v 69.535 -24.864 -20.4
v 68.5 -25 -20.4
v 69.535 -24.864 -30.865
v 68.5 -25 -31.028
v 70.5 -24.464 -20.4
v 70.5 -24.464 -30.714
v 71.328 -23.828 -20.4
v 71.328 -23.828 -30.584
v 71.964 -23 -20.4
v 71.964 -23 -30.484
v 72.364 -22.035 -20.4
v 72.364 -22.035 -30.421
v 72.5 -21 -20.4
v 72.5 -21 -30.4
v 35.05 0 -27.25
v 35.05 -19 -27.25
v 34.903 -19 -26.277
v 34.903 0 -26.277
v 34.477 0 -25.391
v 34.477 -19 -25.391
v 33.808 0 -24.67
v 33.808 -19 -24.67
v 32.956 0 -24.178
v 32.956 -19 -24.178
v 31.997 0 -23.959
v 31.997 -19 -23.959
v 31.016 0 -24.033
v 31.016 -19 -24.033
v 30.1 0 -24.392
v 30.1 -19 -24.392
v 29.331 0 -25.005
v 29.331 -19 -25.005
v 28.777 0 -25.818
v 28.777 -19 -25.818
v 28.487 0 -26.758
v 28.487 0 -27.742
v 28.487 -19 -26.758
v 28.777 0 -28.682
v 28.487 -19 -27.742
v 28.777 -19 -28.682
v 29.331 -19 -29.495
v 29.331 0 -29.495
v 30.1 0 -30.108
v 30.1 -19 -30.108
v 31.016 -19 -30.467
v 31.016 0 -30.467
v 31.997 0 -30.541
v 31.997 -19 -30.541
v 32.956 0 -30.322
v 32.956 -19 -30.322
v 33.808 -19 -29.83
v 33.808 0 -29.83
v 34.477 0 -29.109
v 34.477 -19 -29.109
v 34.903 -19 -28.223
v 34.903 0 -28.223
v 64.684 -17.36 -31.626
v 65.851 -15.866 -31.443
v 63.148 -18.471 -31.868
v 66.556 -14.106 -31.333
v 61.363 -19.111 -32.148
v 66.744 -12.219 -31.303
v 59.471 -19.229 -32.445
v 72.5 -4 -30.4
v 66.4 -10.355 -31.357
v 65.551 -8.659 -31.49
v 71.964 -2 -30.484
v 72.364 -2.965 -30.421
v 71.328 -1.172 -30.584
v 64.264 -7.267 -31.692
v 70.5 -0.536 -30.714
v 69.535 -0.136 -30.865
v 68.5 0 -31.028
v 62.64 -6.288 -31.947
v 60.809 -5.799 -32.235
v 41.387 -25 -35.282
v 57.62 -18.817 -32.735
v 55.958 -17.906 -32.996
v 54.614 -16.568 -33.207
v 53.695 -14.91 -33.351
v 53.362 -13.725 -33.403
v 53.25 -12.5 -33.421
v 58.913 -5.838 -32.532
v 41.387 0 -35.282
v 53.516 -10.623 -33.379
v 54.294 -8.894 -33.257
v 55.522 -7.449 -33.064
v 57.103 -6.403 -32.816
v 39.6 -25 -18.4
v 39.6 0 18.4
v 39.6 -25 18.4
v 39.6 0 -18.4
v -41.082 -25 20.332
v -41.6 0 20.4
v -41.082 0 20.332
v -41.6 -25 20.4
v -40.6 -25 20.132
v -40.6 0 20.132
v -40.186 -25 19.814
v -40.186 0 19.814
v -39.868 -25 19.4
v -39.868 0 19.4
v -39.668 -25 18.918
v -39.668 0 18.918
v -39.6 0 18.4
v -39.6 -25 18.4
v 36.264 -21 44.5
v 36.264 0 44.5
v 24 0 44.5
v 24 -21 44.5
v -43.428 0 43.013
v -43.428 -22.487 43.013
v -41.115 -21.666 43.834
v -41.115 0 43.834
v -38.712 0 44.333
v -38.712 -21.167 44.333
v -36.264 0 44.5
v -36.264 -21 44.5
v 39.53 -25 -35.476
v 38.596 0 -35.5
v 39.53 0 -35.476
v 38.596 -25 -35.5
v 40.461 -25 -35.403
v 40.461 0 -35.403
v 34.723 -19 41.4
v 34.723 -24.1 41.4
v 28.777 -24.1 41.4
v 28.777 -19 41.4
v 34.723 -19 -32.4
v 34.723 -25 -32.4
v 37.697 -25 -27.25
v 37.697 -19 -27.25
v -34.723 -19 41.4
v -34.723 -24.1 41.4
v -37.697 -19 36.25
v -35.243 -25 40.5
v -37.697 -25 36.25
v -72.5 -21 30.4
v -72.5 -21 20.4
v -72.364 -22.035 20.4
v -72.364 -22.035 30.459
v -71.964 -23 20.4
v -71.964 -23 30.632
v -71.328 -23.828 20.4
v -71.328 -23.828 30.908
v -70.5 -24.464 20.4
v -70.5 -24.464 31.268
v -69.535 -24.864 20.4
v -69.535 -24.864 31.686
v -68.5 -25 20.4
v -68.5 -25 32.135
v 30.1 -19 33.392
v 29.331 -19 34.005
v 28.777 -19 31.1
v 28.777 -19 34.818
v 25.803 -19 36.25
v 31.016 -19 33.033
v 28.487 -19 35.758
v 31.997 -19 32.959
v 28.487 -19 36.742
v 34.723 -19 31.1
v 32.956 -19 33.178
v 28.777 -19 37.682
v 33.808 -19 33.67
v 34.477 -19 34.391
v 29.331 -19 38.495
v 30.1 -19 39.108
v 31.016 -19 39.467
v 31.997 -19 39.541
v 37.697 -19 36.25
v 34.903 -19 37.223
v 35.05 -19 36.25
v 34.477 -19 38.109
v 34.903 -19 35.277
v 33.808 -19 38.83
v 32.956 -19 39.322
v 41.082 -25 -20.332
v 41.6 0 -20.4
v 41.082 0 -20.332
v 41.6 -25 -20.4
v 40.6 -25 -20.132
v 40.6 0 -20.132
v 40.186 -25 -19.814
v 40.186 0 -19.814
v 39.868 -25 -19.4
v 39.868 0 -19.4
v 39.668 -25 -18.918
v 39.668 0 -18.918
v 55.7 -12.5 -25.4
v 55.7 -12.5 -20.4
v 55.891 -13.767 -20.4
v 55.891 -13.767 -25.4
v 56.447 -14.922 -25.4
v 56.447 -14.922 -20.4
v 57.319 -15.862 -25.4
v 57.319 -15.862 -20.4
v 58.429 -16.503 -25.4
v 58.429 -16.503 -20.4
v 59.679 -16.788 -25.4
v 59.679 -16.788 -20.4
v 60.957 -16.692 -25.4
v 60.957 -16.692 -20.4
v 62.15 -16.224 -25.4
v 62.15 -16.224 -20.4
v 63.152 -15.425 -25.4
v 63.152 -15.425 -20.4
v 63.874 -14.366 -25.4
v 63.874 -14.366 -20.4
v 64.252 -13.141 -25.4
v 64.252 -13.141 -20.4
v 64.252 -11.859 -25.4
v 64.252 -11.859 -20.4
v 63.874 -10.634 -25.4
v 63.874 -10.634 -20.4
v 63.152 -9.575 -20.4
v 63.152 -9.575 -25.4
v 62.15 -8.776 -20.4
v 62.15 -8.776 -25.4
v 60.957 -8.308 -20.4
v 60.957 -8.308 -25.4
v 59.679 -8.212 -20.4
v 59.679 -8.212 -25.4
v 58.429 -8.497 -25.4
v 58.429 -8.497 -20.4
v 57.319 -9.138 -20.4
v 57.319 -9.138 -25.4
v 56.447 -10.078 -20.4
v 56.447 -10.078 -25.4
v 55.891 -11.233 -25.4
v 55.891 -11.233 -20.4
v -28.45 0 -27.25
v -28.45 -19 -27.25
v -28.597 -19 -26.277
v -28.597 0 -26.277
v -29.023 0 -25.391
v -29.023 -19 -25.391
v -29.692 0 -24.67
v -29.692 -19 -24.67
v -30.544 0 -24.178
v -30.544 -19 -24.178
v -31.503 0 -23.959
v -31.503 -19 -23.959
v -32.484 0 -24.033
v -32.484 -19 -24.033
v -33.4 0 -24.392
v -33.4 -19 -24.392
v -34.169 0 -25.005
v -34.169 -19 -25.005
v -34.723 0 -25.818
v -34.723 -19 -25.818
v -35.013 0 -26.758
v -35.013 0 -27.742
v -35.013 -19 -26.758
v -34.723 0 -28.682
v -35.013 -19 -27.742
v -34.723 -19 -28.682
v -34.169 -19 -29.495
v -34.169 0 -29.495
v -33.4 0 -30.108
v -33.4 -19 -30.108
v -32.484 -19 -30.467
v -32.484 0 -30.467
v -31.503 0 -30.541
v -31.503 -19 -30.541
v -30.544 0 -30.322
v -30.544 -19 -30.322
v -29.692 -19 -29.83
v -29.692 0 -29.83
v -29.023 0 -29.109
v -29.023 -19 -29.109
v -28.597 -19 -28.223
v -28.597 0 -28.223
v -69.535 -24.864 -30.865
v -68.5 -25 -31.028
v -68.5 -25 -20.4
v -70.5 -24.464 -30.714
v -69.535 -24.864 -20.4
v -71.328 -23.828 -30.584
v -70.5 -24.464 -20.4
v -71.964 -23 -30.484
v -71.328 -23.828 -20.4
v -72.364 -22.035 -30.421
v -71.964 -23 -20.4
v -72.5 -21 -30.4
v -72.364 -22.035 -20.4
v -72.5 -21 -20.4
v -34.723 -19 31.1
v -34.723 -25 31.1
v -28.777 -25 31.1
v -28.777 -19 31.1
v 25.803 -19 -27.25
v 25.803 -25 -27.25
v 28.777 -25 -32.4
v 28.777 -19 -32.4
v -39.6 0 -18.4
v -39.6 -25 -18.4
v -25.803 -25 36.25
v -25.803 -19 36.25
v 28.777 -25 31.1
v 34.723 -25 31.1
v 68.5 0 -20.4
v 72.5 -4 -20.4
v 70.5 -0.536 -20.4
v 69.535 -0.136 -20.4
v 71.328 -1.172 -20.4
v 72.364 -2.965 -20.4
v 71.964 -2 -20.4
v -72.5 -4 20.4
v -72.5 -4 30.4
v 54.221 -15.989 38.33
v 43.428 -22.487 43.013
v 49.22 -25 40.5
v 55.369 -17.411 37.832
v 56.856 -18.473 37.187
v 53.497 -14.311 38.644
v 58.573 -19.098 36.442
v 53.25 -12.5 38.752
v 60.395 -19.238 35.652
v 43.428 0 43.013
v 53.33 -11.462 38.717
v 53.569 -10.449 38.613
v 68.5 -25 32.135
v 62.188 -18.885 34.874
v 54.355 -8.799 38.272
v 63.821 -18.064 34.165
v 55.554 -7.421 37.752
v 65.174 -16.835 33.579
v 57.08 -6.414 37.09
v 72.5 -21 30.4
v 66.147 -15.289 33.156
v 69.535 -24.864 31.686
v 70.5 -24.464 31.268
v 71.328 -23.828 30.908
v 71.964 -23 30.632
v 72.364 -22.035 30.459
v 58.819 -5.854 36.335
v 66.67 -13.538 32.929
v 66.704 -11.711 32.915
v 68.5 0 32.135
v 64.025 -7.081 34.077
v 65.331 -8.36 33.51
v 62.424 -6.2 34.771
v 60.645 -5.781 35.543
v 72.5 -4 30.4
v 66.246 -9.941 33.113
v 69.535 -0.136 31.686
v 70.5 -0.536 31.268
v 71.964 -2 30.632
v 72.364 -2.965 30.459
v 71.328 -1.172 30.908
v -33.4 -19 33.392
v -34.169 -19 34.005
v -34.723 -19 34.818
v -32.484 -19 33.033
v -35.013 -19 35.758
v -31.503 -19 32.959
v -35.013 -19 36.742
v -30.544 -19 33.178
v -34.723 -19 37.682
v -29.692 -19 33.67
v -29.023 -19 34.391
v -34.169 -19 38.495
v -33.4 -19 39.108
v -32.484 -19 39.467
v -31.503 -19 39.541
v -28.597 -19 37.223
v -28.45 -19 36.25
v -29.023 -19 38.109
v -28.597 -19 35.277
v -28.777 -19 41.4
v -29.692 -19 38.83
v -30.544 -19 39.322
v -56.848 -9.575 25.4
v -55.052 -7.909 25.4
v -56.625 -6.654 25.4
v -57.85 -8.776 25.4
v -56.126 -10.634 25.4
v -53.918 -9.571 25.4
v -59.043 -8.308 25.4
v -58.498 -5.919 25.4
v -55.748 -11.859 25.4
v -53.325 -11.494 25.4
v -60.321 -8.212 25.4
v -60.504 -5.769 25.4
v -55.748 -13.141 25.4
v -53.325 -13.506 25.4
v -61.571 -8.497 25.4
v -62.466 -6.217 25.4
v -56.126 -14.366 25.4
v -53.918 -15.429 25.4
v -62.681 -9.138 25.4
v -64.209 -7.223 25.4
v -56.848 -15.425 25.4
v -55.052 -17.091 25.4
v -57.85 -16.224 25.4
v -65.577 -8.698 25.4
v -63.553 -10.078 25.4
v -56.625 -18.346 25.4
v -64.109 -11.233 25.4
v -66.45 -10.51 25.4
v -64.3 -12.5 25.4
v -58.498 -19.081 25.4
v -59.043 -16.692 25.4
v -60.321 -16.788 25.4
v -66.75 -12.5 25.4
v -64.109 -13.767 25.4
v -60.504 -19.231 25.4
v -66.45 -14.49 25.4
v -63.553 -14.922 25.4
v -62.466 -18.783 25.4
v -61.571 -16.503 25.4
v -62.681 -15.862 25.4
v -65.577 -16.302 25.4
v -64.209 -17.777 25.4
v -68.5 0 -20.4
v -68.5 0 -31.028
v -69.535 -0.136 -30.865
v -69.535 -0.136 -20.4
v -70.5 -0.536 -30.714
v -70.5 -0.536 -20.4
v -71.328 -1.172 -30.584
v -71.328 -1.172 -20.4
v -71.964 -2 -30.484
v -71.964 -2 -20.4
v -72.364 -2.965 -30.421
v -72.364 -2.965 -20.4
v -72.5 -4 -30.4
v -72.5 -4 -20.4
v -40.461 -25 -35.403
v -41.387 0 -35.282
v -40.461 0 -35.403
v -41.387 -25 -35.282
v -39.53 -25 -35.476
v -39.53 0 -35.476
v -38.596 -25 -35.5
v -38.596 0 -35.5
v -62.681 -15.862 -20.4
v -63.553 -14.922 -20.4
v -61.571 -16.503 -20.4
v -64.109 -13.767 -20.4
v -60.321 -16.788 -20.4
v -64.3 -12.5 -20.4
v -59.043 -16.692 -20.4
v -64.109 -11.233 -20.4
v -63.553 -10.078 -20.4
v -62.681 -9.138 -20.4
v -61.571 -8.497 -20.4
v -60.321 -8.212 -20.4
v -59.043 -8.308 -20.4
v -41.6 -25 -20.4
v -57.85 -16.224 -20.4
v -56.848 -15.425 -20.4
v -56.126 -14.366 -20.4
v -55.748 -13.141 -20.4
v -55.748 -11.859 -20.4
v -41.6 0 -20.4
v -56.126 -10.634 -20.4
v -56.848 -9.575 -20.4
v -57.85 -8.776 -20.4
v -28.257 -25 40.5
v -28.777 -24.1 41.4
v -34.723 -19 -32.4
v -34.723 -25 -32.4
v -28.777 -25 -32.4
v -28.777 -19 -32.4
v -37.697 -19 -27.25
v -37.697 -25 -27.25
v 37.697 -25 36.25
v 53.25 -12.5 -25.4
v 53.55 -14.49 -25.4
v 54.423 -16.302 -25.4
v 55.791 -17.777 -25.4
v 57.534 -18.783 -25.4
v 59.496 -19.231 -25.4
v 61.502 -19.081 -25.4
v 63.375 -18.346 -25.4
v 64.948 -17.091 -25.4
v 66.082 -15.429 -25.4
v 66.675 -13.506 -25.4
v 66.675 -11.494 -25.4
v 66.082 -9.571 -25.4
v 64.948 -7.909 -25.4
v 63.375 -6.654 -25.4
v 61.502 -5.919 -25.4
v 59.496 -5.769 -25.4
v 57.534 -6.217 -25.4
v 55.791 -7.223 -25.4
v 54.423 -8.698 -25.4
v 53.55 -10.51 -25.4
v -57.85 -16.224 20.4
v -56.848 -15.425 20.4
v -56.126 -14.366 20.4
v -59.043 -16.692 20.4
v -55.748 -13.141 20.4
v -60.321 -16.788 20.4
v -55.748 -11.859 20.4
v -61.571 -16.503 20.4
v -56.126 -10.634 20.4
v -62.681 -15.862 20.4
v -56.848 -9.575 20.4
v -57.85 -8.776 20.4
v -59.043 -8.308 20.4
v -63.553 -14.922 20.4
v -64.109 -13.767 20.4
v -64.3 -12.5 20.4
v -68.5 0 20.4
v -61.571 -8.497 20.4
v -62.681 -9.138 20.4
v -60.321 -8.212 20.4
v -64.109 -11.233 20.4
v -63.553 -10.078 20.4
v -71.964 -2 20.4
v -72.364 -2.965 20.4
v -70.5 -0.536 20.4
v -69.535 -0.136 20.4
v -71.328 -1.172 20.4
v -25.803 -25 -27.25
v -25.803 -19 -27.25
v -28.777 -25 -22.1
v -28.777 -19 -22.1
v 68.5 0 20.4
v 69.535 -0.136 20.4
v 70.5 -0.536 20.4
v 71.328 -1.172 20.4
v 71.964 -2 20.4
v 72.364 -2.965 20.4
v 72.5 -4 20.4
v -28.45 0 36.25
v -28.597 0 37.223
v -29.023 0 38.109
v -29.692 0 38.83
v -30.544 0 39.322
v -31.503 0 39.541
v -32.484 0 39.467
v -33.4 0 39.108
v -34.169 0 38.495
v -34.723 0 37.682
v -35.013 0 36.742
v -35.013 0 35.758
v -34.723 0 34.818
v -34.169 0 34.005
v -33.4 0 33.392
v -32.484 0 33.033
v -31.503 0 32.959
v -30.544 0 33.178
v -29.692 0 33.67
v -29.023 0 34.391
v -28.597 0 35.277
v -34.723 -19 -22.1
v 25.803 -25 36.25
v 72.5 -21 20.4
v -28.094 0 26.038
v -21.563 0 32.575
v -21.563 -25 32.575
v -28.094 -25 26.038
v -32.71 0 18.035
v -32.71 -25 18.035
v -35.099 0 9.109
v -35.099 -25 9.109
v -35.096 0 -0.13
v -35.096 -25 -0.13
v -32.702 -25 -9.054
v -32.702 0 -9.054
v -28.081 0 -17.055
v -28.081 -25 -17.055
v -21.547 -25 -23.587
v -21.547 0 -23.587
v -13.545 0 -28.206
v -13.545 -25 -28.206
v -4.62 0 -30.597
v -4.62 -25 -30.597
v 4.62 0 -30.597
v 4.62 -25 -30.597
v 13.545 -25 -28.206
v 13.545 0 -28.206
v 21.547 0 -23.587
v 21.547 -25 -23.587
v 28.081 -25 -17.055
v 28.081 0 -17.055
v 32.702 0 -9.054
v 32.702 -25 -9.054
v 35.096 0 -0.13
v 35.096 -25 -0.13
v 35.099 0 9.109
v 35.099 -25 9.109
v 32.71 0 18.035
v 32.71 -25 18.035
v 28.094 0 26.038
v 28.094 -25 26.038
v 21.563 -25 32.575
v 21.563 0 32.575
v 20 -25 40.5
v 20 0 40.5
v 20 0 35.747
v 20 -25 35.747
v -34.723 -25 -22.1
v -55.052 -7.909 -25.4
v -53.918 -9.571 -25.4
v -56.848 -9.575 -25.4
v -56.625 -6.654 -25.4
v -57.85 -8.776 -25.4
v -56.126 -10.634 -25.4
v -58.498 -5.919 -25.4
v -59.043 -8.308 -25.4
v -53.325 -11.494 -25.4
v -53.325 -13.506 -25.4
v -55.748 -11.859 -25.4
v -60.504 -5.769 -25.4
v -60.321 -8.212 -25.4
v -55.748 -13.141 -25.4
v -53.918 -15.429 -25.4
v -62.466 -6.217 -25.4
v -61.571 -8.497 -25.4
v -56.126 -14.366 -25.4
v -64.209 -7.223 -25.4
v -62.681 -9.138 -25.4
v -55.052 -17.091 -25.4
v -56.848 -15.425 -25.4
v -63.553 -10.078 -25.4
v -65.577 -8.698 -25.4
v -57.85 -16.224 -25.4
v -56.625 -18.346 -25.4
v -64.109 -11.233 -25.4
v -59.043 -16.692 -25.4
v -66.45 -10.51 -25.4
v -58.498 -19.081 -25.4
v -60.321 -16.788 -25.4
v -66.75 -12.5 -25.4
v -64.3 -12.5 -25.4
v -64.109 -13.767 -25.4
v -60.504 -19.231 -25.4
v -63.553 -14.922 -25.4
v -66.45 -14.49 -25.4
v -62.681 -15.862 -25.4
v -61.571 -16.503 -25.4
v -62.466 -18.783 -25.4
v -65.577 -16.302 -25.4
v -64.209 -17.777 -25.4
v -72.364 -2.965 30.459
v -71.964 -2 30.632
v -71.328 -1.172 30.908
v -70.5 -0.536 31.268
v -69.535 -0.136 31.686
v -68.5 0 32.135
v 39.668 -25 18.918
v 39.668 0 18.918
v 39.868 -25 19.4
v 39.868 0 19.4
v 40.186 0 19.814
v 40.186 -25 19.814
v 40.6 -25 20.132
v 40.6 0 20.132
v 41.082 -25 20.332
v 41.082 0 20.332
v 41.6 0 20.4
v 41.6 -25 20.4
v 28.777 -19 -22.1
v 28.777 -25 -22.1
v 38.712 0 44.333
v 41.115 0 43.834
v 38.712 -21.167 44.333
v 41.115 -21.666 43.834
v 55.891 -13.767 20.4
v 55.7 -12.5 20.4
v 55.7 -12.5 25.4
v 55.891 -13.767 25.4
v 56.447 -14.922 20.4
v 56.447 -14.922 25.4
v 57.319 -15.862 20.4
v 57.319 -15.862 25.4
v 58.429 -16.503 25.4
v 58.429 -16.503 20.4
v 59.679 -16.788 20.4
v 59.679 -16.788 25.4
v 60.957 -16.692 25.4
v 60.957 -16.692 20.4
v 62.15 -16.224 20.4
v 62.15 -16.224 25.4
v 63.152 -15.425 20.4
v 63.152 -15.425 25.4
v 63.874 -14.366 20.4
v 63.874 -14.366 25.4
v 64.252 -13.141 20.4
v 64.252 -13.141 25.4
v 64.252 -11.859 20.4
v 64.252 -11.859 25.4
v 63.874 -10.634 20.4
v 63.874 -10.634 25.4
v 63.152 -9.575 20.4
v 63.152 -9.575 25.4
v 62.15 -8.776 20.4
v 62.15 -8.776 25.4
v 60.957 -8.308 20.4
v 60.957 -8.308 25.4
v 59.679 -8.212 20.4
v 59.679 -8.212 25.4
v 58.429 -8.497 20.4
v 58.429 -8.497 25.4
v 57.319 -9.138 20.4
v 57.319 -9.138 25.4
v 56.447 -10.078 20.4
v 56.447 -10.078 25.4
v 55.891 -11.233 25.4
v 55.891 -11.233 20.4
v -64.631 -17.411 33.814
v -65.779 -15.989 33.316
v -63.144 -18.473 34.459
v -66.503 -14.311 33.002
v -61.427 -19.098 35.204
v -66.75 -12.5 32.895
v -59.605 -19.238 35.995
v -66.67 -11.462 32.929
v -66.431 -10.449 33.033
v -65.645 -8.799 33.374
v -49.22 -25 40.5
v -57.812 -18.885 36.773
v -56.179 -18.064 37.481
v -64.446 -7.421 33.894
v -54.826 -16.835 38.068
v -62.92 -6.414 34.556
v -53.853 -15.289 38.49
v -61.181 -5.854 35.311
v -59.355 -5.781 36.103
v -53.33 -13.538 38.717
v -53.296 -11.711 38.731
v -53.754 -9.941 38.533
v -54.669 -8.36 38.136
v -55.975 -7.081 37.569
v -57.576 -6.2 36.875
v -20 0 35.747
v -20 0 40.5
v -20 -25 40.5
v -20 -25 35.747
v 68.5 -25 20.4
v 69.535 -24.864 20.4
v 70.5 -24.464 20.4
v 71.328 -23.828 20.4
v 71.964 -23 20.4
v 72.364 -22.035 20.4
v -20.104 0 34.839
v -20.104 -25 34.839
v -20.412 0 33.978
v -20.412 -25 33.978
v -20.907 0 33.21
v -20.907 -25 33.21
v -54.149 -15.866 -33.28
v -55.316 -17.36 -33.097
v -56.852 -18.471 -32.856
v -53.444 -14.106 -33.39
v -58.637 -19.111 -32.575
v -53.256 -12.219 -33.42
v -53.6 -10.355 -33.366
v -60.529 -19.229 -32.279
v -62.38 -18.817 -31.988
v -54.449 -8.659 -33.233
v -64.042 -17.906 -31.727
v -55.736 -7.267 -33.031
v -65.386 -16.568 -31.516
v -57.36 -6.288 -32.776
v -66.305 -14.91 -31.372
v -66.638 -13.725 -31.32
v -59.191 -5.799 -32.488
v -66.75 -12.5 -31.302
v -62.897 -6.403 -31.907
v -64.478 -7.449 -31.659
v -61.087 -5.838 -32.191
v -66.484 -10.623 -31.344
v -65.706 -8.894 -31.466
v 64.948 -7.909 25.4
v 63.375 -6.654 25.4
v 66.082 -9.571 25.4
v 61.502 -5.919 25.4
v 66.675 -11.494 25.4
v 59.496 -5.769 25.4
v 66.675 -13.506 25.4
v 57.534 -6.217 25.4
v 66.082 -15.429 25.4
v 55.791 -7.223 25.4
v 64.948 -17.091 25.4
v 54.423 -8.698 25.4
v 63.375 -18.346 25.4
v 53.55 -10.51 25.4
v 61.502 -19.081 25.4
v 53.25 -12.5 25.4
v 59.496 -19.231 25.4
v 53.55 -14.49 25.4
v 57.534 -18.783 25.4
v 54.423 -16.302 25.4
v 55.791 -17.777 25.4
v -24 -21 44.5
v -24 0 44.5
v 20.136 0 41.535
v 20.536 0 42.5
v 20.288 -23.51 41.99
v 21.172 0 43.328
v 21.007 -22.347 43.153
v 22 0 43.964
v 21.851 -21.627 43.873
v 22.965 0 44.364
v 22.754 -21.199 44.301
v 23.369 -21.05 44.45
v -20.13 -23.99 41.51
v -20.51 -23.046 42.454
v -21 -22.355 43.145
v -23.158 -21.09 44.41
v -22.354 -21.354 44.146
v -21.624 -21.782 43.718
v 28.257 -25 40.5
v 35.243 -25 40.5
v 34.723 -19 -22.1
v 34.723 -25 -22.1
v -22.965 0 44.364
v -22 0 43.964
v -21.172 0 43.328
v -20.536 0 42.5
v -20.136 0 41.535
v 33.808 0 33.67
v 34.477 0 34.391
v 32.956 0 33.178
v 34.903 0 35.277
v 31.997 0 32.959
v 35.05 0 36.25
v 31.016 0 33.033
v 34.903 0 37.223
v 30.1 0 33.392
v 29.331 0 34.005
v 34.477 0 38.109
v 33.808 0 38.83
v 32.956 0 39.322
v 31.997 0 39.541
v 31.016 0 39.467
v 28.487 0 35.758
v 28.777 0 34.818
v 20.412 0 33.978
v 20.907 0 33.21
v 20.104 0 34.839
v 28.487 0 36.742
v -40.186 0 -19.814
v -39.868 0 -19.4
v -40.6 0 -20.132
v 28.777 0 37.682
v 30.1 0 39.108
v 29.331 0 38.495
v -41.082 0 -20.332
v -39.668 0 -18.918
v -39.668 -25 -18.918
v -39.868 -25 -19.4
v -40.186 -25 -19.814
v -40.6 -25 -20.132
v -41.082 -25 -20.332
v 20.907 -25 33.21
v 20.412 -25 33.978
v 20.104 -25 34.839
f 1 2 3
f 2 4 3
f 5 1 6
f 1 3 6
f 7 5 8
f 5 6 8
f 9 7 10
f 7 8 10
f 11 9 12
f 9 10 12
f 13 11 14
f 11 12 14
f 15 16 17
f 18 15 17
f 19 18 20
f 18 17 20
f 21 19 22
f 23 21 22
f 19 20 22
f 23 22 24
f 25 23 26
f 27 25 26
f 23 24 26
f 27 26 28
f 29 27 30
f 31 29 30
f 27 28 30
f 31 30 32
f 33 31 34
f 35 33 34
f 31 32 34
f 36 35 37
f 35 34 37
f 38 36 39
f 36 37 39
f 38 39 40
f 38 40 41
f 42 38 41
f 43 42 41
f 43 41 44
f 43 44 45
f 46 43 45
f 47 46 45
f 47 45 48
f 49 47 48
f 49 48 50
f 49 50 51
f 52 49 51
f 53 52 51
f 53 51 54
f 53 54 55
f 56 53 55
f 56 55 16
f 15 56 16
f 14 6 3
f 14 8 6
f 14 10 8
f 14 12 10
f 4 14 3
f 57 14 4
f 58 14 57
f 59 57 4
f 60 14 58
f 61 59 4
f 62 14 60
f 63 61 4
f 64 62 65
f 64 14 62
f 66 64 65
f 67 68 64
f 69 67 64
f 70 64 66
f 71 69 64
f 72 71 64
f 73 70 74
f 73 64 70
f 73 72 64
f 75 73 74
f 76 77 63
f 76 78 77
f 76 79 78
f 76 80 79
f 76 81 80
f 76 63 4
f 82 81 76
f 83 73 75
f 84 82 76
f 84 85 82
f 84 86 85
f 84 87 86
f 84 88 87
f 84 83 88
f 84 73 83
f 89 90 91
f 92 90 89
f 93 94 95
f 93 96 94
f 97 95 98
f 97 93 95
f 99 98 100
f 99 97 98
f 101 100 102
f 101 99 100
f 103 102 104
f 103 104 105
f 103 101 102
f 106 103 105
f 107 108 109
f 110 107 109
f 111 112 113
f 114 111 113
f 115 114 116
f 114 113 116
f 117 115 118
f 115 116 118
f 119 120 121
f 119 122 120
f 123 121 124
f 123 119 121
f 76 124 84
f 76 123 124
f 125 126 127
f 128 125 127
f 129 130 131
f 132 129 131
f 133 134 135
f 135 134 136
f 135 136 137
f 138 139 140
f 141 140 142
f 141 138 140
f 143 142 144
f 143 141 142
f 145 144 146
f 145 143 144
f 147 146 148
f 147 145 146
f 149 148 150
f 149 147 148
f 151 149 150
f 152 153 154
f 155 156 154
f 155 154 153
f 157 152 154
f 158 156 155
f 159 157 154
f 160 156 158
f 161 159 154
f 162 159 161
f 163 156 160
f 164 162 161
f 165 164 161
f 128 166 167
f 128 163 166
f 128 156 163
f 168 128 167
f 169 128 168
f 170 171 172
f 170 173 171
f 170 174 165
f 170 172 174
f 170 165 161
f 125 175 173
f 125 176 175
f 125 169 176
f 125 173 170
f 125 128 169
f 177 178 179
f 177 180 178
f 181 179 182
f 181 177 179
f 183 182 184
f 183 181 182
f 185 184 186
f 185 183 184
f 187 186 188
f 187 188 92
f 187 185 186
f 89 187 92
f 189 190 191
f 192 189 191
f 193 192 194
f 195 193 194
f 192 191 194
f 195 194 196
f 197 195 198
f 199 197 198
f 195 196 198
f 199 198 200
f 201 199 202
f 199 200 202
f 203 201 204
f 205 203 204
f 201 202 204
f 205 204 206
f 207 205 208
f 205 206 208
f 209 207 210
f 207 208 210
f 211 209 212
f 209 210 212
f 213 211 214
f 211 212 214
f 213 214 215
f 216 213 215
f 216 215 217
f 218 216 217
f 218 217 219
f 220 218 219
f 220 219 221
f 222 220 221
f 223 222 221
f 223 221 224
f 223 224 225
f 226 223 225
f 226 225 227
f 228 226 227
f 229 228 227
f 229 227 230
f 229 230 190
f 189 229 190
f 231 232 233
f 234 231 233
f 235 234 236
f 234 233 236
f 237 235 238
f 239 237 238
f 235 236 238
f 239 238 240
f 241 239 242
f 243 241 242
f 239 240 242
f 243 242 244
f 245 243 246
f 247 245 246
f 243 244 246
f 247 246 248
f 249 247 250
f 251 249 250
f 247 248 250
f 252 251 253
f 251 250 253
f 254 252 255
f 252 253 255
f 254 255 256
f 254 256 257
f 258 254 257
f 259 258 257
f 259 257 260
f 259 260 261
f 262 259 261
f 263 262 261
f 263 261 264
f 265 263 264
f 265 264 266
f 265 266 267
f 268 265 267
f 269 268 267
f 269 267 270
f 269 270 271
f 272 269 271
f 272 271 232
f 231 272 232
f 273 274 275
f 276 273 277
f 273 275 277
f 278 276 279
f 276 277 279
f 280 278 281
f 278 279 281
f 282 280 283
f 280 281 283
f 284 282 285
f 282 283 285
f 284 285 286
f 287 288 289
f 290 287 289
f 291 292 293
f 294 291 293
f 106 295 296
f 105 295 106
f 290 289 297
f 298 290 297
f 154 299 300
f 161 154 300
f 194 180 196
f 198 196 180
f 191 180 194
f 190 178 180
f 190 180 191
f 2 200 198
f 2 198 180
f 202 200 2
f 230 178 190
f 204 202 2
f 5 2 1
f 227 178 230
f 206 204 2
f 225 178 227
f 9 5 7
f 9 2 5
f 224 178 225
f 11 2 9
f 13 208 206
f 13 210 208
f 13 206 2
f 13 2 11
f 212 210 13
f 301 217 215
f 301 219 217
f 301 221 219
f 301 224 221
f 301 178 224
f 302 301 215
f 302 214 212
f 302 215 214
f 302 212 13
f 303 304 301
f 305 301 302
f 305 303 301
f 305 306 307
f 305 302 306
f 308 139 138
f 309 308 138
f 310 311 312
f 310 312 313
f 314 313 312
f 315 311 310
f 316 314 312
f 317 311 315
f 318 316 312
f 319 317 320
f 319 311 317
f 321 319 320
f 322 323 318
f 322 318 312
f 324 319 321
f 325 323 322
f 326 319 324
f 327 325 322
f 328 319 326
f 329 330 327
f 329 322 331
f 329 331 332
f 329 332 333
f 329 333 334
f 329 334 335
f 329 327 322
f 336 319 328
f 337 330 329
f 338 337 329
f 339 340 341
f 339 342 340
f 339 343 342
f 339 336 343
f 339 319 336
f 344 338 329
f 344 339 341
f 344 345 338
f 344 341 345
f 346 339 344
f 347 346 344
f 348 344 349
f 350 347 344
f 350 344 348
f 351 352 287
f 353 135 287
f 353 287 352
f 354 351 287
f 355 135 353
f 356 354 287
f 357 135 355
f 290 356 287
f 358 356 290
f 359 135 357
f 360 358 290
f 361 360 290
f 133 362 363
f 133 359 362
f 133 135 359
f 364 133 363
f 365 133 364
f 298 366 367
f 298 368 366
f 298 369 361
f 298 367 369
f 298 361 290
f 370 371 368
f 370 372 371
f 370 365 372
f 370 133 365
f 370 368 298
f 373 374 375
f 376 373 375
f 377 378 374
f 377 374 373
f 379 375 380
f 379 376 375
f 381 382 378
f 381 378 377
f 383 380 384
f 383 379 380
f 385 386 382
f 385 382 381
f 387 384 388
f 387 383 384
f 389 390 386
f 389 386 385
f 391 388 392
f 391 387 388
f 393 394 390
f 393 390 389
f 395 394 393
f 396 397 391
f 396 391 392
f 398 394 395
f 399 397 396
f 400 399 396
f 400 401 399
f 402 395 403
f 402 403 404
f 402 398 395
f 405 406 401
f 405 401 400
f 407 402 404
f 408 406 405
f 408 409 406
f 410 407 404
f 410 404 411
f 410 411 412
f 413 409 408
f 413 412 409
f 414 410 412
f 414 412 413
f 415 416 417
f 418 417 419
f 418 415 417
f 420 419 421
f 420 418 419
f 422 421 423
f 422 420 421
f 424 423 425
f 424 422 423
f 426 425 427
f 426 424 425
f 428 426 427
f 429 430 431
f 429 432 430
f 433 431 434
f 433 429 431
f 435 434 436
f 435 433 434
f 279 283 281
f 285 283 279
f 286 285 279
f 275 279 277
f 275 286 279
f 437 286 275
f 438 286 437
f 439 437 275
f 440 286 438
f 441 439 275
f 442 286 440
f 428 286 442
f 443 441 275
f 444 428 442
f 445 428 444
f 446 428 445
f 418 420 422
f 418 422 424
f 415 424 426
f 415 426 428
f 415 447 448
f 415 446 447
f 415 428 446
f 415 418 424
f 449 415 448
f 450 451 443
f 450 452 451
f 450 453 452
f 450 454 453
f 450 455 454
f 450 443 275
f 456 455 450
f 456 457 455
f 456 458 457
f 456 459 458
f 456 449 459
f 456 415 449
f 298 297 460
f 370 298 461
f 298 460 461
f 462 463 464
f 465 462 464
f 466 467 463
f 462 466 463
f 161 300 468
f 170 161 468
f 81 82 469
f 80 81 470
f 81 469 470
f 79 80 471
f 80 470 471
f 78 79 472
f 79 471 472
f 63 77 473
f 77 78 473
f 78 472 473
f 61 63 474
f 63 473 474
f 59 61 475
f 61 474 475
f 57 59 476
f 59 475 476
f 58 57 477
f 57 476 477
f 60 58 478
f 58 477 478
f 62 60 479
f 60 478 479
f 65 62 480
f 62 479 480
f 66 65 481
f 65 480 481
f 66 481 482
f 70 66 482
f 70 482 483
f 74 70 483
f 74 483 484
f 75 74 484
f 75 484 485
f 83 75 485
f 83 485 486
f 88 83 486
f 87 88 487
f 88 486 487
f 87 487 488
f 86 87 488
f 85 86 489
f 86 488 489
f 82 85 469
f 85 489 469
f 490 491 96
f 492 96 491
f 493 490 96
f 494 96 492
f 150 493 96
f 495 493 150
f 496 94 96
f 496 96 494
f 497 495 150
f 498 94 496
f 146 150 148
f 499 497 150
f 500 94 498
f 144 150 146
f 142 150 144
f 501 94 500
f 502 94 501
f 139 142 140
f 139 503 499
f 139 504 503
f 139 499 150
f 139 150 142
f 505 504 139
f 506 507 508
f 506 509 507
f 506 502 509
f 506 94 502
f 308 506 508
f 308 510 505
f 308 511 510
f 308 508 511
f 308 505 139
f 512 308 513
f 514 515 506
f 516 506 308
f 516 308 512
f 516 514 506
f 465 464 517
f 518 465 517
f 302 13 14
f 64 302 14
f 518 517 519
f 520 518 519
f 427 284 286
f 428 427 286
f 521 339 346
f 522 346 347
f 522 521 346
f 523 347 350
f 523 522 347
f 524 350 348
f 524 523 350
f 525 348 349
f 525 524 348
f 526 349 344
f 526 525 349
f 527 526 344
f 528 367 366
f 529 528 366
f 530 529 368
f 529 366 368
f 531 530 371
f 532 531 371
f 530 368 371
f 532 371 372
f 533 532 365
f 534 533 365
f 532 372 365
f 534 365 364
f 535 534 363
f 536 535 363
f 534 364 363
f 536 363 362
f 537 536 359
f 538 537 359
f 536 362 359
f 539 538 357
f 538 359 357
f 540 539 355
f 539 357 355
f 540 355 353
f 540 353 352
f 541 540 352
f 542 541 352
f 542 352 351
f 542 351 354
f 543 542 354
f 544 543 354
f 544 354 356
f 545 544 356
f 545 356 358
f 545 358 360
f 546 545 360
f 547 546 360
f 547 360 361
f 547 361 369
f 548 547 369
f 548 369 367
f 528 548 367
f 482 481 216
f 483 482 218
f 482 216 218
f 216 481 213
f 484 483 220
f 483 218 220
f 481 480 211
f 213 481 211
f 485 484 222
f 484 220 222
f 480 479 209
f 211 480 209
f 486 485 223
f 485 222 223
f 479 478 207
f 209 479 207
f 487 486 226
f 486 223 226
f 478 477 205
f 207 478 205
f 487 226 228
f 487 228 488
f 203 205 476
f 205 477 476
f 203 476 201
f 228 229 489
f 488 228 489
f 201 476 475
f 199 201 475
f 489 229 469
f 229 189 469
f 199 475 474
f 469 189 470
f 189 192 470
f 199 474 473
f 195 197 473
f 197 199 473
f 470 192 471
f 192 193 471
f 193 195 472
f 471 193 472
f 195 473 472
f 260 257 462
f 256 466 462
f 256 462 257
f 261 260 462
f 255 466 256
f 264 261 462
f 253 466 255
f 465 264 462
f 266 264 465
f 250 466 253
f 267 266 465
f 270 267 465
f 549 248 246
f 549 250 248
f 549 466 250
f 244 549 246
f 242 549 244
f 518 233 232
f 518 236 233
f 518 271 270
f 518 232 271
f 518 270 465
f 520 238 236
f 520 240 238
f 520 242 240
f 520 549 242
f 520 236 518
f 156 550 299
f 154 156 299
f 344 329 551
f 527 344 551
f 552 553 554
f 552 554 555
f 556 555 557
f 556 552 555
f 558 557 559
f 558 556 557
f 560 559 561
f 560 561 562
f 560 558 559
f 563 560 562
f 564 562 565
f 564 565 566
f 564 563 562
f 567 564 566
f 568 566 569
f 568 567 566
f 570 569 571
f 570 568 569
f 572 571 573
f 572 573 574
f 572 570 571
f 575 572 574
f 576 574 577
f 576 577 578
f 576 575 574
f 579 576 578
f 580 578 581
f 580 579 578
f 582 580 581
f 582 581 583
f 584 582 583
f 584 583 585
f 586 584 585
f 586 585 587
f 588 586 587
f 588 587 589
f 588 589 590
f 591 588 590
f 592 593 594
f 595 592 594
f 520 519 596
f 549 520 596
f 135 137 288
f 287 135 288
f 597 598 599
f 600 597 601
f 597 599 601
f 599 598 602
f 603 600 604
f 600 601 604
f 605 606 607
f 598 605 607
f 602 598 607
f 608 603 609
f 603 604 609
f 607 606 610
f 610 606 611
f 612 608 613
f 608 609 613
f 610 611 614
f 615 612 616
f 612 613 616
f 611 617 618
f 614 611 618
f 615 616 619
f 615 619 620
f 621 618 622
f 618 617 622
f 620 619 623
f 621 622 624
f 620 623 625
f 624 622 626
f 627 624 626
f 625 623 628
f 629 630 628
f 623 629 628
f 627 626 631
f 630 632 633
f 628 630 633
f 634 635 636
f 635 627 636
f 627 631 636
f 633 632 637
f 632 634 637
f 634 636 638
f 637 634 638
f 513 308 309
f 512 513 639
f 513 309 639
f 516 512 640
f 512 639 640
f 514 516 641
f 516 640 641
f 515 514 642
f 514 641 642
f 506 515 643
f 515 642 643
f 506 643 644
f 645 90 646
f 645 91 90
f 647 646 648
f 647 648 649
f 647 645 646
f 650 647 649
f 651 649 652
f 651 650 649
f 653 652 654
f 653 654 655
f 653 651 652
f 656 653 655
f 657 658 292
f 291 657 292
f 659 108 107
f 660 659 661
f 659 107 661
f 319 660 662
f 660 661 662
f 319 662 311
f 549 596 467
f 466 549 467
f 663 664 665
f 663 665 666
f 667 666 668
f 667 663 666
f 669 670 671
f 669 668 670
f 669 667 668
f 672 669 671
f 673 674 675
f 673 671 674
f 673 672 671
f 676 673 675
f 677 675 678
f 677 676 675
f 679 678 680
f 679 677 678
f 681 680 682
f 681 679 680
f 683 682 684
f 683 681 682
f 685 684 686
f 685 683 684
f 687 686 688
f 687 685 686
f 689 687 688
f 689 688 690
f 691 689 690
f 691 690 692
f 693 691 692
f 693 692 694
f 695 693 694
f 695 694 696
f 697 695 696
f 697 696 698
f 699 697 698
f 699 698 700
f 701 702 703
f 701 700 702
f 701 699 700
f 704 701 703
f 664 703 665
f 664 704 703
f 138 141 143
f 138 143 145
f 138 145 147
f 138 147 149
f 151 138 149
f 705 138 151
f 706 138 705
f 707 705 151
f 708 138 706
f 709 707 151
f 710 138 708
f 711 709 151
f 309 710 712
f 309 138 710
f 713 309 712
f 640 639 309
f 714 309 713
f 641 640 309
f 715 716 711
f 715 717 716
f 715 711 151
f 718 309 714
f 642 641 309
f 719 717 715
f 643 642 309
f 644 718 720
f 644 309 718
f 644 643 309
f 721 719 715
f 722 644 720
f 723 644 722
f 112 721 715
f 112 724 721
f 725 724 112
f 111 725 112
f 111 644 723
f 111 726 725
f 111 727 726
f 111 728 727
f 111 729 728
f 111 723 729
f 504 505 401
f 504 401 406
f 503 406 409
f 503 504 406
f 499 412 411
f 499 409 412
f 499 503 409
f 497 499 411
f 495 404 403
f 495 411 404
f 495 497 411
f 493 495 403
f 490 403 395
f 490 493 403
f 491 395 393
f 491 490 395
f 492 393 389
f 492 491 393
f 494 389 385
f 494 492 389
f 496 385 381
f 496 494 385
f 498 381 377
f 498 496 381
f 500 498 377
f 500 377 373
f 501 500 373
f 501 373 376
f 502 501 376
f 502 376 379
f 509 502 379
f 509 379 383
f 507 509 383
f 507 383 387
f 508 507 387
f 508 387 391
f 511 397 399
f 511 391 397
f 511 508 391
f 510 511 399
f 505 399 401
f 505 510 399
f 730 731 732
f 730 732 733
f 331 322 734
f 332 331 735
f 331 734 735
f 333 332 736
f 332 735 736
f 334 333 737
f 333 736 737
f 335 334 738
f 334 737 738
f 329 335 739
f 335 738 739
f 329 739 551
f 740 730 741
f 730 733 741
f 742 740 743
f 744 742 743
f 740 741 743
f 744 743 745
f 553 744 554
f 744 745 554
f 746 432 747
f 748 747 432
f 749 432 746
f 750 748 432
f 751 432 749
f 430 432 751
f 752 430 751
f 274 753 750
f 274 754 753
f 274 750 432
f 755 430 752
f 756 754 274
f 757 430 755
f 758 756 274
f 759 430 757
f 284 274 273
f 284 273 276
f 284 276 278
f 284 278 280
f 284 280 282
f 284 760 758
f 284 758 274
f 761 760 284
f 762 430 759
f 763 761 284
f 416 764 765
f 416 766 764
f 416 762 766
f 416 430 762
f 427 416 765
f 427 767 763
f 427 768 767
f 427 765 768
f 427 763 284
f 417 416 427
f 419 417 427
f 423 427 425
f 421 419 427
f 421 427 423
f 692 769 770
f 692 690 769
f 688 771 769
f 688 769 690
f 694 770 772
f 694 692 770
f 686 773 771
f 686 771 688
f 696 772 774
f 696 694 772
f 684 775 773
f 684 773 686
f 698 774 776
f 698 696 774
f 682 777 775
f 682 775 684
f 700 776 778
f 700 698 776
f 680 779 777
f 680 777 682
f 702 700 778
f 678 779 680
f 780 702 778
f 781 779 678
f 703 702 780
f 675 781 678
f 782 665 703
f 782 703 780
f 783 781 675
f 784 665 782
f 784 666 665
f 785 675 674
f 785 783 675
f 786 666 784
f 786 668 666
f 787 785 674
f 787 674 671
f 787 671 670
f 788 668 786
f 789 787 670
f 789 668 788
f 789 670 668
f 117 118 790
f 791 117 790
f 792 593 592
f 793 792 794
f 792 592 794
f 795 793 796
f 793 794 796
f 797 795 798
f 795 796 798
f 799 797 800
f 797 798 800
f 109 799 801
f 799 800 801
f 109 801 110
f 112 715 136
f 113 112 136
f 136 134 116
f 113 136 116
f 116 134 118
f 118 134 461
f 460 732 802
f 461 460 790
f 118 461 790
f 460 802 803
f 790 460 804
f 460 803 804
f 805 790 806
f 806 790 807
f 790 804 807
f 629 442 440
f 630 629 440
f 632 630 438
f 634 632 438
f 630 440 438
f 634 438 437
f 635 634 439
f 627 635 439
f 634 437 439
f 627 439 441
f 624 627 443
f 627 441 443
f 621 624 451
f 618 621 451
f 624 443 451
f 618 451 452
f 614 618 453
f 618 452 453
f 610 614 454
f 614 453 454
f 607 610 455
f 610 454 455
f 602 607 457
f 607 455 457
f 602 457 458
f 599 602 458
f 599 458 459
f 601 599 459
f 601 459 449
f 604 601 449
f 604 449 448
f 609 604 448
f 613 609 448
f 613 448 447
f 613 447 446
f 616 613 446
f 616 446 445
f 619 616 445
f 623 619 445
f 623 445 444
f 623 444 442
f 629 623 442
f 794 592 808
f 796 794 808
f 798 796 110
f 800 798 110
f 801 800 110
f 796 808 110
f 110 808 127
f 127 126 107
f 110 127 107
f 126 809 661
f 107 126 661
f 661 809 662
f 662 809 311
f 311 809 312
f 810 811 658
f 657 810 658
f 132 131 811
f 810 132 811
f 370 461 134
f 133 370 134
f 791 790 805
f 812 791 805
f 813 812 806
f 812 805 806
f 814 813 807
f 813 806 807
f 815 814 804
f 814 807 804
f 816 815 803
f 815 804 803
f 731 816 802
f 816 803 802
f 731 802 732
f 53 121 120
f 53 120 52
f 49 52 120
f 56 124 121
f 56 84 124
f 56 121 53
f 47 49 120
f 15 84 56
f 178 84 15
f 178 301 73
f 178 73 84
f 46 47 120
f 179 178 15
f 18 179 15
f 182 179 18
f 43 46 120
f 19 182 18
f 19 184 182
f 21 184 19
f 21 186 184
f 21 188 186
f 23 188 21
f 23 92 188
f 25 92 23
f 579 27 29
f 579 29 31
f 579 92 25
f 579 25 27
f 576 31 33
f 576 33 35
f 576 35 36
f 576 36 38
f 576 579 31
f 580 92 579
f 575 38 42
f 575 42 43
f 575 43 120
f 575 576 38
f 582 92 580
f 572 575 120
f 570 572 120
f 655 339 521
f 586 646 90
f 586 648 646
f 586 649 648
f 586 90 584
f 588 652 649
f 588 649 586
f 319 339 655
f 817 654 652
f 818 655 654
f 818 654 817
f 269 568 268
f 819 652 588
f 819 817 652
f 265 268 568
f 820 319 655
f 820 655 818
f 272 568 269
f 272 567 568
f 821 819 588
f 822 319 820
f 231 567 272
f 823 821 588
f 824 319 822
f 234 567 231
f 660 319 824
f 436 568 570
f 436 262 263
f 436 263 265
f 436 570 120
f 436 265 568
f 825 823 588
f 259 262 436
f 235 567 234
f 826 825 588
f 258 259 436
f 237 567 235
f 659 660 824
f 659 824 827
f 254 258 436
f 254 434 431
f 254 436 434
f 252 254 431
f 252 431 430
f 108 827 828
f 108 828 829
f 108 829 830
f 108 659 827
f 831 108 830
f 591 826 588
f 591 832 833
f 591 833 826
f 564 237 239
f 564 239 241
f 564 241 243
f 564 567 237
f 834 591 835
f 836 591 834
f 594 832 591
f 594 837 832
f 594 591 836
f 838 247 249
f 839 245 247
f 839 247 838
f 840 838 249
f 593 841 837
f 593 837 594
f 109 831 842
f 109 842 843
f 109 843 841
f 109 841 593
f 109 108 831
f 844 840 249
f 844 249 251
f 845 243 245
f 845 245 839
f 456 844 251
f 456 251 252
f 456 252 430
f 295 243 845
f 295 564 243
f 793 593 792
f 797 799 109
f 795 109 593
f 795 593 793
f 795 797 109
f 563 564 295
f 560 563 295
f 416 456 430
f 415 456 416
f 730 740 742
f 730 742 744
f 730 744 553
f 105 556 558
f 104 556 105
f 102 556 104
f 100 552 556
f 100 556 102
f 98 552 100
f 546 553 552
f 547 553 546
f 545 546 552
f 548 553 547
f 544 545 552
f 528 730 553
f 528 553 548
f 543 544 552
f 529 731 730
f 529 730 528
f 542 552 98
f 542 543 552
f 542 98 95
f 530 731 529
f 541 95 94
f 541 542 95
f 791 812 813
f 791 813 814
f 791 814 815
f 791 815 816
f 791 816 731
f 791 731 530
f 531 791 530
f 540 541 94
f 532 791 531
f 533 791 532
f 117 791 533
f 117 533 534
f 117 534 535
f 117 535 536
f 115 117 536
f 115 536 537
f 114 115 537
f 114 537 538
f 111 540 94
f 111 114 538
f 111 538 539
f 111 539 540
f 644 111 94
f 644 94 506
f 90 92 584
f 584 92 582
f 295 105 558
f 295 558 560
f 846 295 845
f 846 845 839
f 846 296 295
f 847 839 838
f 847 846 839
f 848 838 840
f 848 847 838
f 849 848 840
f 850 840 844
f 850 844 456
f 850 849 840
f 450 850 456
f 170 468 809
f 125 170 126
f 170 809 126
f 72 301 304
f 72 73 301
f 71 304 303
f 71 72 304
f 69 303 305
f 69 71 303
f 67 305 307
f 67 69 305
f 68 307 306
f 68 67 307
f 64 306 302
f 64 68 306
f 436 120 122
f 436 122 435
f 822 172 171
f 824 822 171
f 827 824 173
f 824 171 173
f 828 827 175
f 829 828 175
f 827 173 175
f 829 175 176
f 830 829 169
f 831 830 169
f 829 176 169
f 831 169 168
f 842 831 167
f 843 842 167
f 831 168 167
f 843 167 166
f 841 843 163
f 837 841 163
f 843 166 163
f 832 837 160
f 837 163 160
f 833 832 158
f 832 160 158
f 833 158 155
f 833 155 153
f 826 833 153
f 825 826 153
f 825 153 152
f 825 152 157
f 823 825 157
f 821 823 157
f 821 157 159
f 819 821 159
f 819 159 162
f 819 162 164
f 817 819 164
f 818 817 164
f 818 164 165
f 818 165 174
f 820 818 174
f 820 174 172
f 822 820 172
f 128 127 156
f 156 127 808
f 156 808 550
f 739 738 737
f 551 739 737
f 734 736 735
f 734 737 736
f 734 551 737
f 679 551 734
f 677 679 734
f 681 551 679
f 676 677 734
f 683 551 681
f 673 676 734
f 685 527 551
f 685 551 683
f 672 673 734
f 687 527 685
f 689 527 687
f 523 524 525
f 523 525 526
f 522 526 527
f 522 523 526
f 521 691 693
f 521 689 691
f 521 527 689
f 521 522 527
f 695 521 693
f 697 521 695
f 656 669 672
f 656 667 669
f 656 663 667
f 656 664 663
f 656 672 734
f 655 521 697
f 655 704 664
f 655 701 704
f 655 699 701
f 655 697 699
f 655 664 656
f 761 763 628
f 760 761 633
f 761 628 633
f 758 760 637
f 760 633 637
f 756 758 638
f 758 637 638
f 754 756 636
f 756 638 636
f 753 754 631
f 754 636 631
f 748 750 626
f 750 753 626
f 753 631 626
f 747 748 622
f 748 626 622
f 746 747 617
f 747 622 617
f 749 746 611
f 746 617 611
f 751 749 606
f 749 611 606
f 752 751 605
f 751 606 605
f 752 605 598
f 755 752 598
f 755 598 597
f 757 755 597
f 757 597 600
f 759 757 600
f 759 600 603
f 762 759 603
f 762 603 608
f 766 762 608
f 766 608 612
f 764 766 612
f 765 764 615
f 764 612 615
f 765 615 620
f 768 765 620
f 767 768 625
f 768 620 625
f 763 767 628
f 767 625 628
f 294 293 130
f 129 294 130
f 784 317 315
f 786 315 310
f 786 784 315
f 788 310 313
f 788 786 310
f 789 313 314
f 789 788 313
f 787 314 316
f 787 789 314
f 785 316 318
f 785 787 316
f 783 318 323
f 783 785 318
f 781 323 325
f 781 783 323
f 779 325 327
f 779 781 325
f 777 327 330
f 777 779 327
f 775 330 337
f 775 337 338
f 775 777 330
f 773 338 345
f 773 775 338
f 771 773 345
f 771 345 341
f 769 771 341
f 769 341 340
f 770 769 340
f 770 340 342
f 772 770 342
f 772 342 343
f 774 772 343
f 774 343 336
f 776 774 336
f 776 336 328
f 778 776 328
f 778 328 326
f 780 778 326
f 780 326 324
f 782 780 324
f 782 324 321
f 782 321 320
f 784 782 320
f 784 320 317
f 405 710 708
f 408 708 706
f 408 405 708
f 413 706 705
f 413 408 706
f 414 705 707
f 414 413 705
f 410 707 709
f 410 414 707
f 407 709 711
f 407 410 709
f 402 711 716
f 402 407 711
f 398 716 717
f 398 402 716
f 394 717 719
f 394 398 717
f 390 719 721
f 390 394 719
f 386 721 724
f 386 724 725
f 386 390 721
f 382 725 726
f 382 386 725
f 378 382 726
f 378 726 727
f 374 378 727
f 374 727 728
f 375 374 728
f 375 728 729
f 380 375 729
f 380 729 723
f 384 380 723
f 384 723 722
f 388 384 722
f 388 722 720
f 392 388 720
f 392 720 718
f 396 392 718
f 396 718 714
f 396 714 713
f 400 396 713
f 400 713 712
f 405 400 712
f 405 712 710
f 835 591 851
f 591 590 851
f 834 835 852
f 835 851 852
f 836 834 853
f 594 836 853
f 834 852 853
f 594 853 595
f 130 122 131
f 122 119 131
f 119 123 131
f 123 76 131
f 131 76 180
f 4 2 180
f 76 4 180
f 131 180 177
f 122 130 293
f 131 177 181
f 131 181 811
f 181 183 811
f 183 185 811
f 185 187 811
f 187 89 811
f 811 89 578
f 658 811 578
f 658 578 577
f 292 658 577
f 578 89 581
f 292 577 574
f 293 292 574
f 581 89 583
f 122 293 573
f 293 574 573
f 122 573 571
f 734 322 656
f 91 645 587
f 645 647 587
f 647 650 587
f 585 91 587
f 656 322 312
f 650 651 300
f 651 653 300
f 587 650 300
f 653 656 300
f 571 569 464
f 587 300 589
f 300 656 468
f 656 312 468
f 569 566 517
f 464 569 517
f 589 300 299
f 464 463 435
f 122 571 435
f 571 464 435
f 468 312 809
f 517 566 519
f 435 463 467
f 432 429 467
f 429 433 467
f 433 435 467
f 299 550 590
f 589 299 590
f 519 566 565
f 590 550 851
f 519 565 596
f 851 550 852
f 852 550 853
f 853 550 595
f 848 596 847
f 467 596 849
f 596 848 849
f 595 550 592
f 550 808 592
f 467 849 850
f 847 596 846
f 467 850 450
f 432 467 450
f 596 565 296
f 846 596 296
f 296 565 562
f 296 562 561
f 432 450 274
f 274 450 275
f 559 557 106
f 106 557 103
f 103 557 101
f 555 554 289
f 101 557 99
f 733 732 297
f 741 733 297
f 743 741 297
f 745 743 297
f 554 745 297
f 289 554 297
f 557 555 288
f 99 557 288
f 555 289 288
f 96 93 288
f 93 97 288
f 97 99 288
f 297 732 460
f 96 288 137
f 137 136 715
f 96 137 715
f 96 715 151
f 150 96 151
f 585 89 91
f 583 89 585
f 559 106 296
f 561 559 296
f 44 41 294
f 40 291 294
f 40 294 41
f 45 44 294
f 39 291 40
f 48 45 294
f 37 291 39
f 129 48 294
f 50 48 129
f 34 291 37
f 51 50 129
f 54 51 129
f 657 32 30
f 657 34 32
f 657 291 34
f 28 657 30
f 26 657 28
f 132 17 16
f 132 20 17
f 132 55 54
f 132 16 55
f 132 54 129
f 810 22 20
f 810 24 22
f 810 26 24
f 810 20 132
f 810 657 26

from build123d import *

# Parameters (mm, degrees)
PAD_DEPTH         = 25
SKETCH001_R       = 4.3
POCKET_DEPTH      = 100
POCKET_DEPTH_BACK = -100
SKETCH002_R       = 6.75
POCKET001_DEPTH   = 10.101
SKETCH003_R       = 6.75
POCKET002_DEPTH   = 19.101
SKETCH004_R       = 3.3
POCKET003_DEPTH   = 25.001
POCKET004_DEPTH   = 6
FILLET_R          = 4
FILLET001_R       = 2
FILLET002_R       = 18
FILLET003_R       = 4
POCKET005_DEPTH   = 145.001


with BuildPart() as part:
    # Sketch → Pad (new body)
    with BuildSketch(Plane.XZ):
        with BuildLine():
            Line((-72.5, 20.4), (-72.5, 30.4))
            Line((-72.5, 30.4), (-40, 44.5))
            Line((-40, 44.5), (-20, 44.5))
            Line((-20, 44.5), (-20, 33.708903))
            ThreePointArc((-20, 33.708903), (0, -30.9), (20, 33.708903))
            Line((20, 44.5), (20, 33.708903))
            Line((40, 44.5), (20, 44.5))
            Line((40, 44.5), (72.5, 30.4))
            Line((72.5, 30.4), (72.5, 20.4))
            Line((72.5, 20.4), (39.6, 20.4))
            Line((39.6, 20.4), (39.6, -20.4))
            Line((39.6, -20.4), (72.5, -20.4))
            Line((72.5, -20.4), (72.5, -30.4))
            Line((72.5, -30.4), (40, -35.5))
            Line((40, -35.5), (-40, -35.5))
            Line((-40, -35.5), (-72.5, -30.4))
            Line((-72.5, -30.4), (-72.5, -20.4))
            Line((-72.5, -20.4), (-39.6, -20.4))
            Line((-39.6, -20.4), (-39.6, 20.4))
            Line((-39.6, 20.4), (-72.5, 20.4))
        make_face()
    extrude(amount=PAD_DEPTH)

    # Sketch001 (on Face11 of Pad) → Pocket (cut, two sides)
    with BuildSketch(Plane(origin=(0, 0, -20.4), x_dir=(-1, 0, 0), z_dir=(0, 0, 1))) as pocket_sk:
        with Locations((-60, 12.5)):
            Circle(SKETCH001_R)
        with Locations((60, 12.5)):
            Circle(SKETCH001_R)
    extrude(amount=-POCKET_DEPTH, mode=Mode.SUBTRACT)
    extrude(pocket_sk.sketch, amount=-POCKET_DEPTH_BACK, mode=Mode.SUBTRACT)

    # Sketch002 (on Face16 of Pocket) → Pocket001 (cut, through all)
    with BuildSketch(Plane(origin=(0, 0, -25.4), x_dir=(-1, 0, 0), z_dir=(0, 0, 1))):
        with Locations((-60, 12.5)):
            Circle(SKETCH002_R)
        with Locations((60, 12.5)):
            Circle(SKETCH002_R)
    extrude(amount=-POCKET001_DEPTH, mode=Mode.SUBTRACT)

    # Sketch003 (on Face16 of Pocket001) → Pocket002 (cut, through all)
    with BuildSketch(Plane(origin=(0, 0, 25.4), x_dir=(-1, 0, 0), z_dir=(0, 0, 1))):
        with Locations((-60, 12.5)):
            Circle(SKETCH003_R)
        with Locations((60, 12.5)):
            Circle(SKETCH003_R)
    extrude(amount=POCKET002_DEPTH, mode=Mode.SUBTRACT)

    # Sketch004 (on Face4 of Pocket002) → Pocket003 (cut, through all)
    with BuildSketch(Plane.XZ.offset(25)):
        with Locations((-31.75, 36.25)):
            Circle(SKETCH004_R)
        with Locations((31.75, 36.25)):
            Circle(SKETCH004_R)
        with Locations((31.75, -27.25)):
            Circle(SKETCH004_R)
        with Locations((-31.75, -27.25)):
            Circle(SKETCH004_R)
    extrude(amount=-POCKET003_DEPTH, mode=Mode.SUBTRACT)

    # Sketch005 (on Face4 of Pocket003) → Pocket004 (cut)
    with BuildSketch(Plane.XZ.offset(25)):
        Polygon((-25.803292, 36.25), (-28.776646, 41.4), (-34.723354, 41.4), (-37.696708, 36.25), (-34.723354, 31.1), (-28.776646, 31.1), align=None)
        Polygon((34.723354, 31.1), (37.696708, 36.25), (34.723354, 41.4), (28.776646, 41.4), (25.803292, 36.25), (28.776646, 31.1), align=None)
        Polygon((28.776646, -32.4), (34.723354, -32.4), (37.696708, -27.25), (34.723354, -22.1), (28.776646, -22.1), (25.803292, -27.25), align=None)
        Polygon((-28.776646, -32.4), (-25.803292, -27.25), (-28.776646, -22.1), (-34.723354, -22.1), (-37.696708, -27.25), (-34.723354, -32.4), align=None)
    extrude(amount=-POCKET004_DEPTH, mode=Mode.SUBTRACT)

    # Fillet
    fillet_edges = [part.edges().sort_by_distance(p)[0] for p in [
        (72.5, -25, 25.4),
        (72.5, 0, 25.4),
        (72.5, -25, -25.4),
        (72.5, 0, -25.4),
        (-72.5, -25, 25.4),
        (-72.5, -25, -25.4),
        (-72.5, 0, 25.4),
        (-72.5, 0, -25.4),
    ]]
    fillet(fillet_edges, radius=FILLET_R)

    # Fillet001
    fillet001_edges = [part.edges().sort_by_distance(p)[0] for p in [
        (-39.6, -12.5, -20.4),
        (-39.6, -12.5, 20.4),
        (39.6, -12.5, -20.4),
        (39.6, -12.5, 20.4),
    ]]
    fillet(fillet001_edges, radius=FILLET001_R)

    # Fillet002
    fillet002_edges = [part.edges().sort_by_distance(p)[0] for p in [
        (40, -12.5, 44.5),
        (-40, -12.5, 44.5),
        (40, -12.5, -35.5),
        (-40, -12.5, -35.5),
    ]]
    fillet(fillet002_edges, radius=FILLET002_R)

    # Fillet003
    fillet003_edges = [part.edges().sort_by_distance(p)[0] for p in [
        (-20, -12.5, 44.5),
        (-20, -12.5, 33.708903),
        (20, -12.5, 44.5),
        (20, -12.5, 33.708903),
    ]]
    fillet(fillet003_edges, radius=FILLET003_R)

    # Sketch006 (on Face39 of Fillet003) → Pocket005 (cut, through all)
    with BuildSketch(Plane(origin=(72.5, 0, 0), x_dir=(0, 0, 1), z_dir=(1, 0, 0))):
        Polygon((40.5, 25), (44.5, 21), (44.5, 25), align=None)
    extrude(amount=-POCKET005_DEPTH, mode=Mode.SUBTRACT)


solid = part.part
